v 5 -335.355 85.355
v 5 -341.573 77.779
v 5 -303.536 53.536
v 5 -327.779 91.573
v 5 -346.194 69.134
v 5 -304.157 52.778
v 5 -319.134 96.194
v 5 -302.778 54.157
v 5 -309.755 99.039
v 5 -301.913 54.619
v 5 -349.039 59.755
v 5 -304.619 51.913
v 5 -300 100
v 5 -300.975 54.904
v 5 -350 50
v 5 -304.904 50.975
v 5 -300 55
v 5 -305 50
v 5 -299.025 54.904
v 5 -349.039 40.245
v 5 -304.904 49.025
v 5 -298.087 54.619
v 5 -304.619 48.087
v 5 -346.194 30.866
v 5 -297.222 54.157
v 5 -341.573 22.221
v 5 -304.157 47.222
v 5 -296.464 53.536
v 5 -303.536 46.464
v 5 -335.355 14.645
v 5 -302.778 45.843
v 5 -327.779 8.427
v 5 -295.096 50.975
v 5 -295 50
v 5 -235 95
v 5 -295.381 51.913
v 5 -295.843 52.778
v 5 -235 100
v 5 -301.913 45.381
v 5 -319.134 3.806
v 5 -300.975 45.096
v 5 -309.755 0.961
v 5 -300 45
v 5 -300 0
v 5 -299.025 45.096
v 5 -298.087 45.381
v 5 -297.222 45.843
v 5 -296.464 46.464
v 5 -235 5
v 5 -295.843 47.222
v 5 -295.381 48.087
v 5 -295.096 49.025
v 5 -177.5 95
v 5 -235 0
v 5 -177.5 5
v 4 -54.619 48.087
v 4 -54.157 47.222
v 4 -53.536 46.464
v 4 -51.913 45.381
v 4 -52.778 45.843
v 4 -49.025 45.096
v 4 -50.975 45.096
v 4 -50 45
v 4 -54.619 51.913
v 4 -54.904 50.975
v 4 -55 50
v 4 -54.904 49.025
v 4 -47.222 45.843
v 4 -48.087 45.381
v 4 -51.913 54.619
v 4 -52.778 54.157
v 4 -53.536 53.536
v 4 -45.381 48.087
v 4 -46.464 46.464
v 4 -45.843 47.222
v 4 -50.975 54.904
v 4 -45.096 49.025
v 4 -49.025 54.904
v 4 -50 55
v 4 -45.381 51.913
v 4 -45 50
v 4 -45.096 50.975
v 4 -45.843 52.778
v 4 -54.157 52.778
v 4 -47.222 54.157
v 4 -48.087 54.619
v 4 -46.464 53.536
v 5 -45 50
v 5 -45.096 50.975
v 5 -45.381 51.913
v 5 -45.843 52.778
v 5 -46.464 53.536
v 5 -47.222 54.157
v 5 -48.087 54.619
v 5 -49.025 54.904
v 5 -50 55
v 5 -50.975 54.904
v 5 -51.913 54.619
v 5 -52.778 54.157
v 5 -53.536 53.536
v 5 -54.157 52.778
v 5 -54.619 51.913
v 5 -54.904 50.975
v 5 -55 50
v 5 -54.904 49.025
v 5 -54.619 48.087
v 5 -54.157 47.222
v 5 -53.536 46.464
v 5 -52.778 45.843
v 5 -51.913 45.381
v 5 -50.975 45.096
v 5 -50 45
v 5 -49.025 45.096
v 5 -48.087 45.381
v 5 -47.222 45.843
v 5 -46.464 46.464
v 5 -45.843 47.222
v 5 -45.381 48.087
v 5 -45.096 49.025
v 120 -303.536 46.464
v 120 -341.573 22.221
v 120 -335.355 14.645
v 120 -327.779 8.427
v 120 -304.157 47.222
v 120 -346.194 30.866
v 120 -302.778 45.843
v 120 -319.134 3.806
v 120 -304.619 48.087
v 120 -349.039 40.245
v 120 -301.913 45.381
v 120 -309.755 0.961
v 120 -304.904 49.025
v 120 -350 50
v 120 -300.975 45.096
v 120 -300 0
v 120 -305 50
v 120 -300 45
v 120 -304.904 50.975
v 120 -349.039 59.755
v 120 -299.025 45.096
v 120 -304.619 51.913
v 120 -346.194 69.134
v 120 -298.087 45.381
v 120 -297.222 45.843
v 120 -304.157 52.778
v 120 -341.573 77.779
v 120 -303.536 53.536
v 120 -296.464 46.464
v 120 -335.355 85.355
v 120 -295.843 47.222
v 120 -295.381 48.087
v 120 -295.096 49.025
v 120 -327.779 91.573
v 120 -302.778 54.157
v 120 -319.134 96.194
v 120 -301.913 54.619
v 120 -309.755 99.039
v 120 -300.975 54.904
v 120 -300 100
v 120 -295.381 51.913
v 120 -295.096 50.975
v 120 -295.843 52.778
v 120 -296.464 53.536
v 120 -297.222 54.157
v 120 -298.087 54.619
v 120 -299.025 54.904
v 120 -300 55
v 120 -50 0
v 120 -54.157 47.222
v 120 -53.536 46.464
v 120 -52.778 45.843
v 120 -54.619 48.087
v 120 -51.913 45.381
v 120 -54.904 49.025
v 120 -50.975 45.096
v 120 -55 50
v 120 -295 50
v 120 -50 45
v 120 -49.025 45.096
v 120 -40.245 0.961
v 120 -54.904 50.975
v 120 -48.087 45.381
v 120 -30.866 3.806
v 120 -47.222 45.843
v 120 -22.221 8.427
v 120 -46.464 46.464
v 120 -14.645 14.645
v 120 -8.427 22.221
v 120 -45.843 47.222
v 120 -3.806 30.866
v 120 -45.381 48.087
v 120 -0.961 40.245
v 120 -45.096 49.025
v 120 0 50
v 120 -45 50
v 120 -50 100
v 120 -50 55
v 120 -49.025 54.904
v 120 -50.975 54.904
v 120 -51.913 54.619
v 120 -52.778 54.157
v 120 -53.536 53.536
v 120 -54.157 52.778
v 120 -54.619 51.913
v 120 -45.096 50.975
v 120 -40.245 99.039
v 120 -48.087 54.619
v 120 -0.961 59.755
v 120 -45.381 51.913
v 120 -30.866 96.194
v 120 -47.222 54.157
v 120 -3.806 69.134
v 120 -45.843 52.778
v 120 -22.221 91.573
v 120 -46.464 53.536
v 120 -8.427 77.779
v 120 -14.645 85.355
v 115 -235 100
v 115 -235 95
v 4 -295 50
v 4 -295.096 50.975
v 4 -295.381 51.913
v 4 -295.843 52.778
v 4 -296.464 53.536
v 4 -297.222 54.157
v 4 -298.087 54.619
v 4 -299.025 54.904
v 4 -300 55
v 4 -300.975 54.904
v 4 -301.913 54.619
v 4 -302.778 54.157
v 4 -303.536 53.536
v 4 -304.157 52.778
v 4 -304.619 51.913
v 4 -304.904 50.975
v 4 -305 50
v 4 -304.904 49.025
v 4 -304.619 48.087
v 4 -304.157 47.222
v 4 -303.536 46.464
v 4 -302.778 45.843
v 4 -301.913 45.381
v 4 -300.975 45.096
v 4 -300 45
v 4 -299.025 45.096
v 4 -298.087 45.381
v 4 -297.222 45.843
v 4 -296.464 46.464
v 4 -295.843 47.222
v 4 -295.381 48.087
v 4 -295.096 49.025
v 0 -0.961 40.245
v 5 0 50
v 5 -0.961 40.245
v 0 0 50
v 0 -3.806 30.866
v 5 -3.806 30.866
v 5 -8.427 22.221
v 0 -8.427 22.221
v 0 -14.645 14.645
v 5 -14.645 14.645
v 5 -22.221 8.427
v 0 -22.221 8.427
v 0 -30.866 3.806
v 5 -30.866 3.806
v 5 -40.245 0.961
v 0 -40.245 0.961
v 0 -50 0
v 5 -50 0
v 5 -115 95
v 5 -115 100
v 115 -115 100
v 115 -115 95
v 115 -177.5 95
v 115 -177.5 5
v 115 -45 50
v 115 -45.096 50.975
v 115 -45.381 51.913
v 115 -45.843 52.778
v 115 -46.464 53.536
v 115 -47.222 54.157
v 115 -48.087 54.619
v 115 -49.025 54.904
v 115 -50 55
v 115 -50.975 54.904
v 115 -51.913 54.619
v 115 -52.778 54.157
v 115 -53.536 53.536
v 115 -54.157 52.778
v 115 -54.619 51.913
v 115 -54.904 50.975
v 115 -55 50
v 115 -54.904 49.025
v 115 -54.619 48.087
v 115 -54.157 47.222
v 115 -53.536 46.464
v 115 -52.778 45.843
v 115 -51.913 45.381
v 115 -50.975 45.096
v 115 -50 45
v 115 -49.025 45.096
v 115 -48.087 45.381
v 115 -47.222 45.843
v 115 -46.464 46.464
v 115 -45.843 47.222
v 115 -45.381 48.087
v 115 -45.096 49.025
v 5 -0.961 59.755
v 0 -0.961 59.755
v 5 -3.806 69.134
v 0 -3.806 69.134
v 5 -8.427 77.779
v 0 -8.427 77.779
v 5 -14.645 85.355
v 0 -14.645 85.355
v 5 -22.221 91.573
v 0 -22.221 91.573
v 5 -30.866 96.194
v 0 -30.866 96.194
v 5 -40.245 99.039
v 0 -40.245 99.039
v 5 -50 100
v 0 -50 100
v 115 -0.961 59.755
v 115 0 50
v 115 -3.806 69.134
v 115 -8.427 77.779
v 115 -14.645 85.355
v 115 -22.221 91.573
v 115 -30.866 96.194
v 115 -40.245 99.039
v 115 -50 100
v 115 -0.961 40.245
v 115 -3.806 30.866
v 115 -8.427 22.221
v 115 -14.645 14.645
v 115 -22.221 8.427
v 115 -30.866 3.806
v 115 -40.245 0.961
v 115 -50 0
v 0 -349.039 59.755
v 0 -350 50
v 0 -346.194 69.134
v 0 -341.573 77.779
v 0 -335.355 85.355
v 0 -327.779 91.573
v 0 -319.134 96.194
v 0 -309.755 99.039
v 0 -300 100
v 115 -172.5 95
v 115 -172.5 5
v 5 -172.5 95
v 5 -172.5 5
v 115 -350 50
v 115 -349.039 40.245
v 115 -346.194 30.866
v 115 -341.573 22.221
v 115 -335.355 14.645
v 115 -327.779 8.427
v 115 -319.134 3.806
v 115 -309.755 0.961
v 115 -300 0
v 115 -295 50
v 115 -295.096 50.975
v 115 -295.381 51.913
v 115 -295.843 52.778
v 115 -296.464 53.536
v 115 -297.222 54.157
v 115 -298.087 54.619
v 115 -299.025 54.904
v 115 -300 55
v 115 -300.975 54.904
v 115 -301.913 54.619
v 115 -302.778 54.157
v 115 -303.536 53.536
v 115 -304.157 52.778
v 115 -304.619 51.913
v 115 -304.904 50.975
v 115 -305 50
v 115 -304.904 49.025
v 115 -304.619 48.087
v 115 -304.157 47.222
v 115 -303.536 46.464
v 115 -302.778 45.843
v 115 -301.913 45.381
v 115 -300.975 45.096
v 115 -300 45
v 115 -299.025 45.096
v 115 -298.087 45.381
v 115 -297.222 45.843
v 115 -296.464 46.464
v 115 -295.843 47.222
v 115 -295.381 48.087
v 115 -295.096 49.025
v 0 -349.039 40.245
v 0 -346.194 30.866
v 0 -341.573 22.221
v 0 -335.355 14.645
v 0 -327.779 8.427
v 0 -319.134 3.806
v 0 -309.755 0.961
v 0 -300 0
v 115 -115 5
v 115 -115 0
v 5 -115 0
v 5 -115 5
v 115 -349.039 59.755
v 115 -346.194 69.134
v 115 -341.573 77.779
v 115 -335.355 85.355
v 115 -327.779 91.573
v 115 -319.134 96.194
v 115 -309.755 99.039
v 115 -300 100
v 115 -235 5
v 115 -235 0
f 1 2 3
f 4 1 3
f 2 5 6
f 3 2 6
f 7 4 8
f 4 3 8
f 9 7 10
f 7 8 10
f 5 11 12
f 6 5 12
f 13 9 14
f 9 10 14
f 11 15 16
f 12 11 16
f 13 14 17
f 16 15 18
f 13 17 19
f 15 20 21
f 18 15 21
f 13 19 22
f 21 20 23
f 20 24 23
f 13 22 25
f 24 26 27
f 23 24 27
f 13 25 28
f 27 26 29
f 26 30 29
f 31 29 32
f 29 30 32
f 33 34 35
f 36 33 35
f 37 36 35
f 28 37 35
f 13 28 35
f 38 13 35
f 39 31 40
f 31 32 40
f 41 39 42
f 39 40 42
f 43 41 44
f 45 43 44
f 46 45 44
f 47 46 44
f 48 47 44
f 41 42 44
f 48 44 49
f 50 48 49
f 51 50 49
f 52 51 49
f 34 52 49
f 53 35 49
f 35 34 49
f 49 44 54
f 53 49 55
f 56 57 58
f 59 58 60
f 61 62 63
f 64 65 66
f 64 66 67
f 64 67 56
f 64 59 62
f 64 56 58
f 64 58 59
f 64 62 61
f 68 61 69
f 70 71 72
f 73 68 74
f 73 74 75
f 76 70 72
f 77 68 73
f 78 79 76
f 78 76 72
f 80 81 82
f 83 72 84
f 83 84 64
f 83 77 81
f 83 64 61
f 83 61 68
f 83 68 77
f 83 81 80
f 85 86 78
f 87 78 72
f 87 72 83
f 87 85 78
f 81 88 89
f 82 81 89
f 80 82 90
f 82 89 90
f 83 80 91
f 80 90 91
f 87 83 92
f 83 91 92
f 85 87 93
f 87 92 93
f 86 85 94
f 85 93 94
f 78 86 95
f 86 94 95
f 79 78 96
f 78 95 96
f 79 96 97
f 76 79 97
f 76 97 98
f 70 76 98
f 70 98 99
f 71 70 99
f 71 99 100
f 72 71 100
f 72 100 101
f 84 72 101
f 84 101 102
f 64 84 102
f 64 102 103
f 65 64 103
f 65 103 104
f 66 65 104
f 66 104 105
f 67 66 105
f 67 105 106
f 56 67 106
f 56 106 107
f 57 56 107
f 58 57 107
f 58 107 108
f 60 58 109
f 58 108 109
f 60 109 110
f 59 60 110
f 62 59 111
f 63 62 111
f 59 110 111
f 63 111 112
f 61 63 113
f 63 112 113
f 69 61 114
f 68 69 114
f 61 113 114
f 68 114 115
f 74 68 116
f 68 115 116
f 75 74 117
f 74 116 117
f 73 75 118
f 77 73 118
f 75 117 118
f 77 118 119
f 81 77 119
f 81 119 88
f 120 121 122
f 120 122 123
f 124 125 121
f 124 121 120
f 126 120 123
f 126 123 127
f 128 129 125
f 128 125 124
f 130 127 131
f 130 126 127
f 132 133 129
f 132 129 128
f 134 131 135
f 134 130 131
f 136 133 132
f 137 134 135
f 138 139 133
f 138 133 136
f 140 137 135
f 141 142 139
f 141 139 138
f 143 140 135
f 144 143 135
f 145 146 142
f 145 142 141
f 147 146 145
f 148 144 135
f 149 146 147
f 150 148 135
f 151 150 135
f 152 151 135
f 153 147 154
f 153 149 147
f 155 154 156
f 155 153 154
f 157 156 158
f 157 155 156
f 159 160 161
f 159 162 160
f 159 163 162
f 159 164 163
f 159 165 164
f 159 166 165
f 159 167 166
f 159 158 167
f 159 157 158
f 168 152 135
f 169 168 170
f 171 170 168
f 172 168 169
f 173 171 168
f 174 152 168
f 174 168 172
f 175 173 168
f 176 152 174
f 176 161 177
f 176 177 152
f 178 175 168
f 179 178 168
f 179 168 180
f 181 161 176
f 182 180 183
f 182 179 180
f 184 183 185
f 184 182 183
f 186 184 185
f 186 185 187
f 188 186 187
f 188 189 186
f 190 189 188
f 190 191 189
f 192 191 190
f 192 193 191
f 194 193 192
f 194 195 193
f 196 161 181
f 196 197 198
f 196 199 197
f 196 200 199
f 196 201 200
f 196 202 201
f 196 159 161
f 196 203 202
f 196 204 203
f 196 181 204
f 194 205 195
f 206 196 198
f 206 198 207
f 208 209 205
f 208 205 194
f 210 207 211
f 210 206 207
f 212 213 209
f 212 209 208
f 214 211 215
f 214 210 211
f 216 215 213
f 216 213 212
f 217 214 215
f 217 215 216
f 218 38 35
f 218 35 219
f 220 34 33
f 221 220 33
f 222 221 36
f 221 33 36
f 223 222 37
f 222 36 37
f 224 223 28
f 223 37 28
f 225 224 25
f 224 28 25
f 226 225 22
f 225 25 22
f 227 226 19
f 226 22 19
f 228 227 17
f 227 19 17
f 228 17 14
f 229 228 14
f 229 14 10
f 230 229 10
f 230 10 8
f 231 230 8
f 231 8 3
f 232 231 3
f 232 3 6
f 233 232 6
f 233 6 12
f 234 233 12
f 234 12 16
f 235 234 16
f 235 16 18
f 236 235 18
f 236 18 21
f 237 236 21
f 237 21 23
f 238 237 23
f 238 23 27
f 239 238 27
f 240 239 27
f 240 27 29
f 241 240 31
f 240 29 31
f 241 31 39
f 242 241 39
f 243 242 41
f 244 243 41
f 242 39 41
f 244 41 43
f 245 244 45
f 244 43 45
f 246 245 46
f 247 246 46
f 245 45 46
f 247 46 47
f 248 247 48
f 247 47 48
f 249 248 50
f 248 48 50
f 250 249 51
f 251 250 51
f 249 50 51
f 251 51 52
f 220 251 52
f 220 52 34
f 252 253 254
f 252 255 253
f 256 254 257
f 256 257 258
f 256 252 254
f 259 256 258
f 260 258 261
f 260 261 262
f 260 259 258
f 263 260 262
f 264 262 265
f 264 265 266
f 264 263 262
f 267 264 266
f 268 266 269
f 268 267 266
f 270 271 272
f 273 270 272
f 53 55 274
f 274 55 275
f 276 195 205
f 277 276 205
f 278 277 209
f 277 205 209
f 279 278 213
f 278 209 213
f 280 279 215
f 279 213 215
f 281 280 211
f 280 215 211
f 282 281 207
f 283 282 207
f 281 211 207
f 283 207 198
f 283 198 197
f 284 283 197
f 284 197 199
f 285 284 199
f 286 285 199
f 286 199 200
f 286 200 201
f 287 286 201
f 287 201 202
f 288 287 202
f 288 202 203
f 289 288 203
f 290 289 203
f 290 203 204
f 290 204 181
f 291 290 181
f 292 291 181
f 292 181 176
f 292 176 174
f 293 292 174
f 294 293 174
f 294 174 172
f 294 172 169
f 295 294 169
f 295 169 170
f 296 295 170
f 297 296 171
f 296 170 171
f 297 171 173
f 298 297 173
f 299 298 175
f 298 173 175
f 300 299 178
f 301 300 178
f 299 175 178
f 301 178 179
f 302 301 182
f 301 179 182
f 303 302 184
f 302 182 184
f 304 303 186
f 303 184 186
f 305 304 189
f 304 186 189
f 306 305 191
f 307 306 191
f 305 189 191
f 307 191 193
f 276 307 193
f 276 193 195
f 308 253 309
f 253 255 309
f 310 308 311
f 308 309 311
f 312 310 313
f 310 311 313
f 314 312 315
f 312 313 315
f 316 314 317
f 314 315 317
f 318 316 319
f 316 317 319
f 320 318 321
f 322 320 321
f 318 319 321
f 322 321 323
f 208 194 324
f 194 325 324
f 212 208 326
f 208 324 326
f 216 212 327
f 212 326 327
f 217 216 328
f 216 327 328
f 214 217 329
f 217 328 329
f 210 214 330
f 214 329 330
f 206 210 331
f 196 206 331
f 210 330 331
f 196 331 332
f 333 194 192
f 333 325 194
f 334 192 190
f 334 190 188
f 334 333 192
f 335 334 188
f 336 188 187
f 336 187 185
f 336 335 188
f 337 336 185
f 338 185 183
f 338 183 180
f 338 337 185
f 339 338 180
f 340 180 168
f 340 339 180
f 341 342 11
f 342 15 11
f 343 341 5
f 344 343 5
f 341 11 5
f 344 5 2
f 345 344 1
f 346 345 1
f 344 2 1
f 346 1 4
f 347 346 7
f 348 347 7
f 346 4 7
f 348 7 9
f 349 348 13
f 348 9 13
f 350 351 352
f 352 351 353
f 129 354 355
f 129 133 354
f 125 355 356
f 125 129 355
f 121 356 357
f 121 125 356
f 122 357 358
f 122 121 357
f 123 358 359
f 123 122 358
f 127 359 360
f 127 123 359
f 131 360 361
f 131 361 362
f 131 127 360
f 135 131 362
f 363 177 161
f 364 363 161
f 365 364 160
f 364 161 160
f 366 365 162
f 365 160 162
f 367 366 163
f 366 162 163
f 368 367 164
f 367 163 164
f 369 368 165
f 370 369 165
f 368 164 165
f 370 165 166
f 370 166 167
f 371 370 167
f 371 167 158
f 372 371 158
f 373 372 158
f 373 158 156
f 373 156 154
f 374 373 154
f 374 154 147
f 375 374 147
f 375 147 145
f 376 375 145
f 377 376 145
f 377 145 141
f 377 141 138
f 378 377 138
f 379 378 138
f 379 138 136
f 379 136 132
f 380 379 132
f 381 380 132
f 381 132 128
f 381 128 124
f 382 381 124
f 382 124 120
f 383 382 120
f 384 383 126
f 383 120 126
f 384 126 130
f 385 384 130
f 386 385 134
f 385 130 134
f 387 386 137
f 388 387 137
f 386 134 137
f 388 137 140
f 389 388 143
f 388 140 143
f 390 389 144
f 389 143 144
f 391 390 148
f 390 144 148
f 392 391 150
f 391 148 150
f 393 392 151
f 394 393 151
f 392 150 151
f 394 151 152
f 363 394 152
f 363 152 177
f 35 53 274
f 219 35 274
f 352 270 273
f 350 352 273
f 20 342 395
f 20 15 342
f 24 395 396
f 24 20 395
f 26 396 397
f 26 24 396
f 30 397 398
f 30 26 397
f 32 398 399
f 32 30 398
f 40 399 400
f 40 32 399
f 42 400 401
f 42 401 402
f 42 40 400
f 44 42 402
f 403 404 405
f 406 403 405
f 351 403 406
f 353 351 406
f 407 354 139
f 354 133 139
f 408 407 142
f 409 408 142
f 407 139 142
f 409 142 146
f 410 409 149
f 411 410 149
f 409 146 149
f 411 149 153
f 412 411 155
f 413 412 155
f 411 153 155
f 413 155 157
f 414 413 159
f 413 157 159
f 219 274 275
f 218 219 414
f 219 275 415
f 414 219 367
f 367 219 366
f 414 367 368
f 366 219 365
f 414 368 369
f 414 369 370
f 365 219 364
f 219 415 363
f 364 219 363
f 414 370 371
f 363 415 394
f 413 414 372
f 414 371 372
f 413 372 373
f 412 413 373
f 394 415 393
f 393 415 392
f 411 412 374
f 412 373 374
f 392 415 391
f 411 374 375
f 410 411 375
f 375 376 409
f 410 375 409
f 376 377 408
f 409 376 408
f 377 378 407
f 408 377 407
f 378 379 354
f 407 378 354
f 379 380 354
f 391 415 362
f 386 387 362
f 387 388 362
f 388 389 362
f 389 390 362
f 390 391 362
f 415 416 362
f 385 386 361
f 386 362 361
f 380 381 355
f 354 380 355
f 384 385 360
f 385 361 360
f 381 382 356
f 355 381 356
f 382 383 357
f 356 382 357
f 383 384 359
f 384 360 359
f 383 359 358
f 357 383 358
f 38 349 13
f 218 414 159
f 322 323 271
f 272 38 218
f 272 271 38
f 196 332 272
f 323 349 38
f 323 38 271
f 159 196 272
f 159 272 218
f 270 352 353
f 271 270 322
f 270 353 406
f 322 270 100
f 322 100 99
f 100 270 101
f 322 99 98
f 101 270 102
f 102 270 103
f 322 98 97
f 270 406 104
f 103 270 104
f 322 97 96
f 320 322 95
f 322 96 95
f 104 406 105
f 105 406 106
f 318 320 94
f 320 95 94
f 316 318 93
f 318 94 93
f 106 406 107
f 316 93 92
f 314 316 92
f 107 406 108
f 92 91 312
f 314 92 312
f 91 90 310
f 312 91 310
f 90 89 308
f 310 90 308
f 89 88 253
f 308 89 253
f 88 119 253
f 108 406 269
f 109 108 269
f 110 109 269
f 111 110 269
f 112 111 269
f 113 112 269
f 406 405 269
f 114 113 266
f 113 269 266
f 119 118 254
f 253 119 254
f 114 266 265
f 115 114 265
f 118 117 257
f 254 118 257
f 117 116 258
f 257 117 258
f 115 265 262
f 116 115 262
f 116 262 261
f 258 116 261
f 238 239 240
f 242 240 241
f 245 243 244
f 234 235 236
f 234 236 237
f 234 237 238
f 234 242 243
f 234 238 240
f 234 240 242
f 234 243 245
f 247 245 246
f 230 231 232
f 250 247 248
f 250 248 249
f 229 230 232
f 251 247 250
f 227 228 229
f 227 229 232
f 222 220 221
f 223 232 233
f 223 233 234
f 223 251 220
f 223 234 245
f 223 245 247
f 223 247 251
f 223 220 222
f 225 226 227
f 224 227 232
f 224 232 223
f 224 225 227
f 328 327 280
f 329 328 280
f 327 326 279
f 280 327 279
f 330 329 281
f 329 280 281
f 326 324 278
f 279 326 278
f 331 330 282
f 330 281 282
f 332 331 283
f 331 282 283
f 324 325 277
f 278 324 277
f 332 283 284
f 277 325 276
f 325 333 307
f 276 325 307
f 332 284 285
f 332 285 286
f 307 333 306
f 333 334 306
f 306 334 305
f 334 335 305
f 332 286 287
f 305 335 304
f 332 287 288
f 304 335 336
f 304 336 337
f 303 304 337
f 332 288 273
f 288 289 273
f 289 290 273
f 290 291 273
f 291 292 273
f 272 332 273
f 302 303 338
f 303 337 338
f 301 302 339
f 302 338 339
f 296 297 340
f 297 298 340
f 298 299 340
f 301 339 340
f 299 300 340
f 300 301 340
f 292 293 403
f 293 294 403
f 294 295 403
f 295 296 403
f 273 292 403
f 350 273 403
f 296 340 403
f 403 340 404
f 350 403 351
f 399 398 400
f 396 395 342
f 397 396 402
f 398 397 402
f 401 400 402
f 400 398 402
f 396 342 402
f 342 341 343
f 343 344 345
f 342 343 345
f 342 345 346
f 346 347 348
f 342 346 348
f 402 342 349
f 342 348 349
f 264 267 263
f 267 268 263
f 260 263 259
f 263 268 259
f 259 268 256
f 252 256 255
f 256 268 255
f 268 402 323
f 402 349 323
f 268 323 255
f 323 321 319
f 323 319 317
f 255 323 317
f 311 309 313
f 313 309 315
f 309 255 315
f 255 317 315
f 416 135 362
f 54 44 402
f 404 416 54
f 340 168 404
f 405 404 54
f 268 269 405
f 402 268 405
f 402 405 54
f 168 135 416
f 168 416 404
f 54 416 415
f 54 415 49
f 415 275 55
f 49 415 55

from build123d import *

# Parameters (mm, degrees)
BOSS_EXTRUDE1_DEPTH = 100
FILLET1_R           = 50
SKETCH2_R           = 5
CUT_EXTRUDE1_DEPTH  = 116
SKETCH5_W           = 120
SKETCH5_H           = 120
BOSS_EXTRUDE4_DEPTH = 5
SKETCH6_W           = 110
SKETCH6_H           = 120
BOSS_EXTRUDE6_DEPTH = 5


with BuildPart() as part:
    # Sketch1 → Boss-Extrude1 (new body)
    with BuildSketch(Plane.XY):
        Polygon((5, -172.5), (5, -8), (5, 0), (0, 0), (0, -8), (0, -146), (0, -154), (0, -292), (0, -350), (5, -350), (5, -292), (5, -177.5), (115, -177.5), (115, -293.5), (115, -350), (120, -350), (120, -293.5), (120, -155.5), (120, -147.5), (120, -9.5), (120, 0), (115, 0), (115, -9.5), (115, -172.5), align=None)
    extrude(amount=BOSS_EXTRUDE1_DEPTH)

    # Fillet1
    fillet1_edges = [part.edges().sort_by_distance(p)[0] for p in [
        (2.5, 0, 100),
        (2.5, 0, 0),
        (117.5, -350, 0),
        (117.5, -350, 100),
        (2.5, -350, 100),
        (2.5, -350, 0),
        (117.5, 0, 100),
        (117.5, 0, 0),
    ]]
    fillet(fillet1_edges, radius=FILLET1_R - 0.0001)  # a hair under: the kernel refuses the full size

    # Sketch2 → Cut-Extrude1 (cut)
    with BuildSketch(Plane(origin=(120, 0, 0), x_dir=(0, 0, -1), z_dir=(1, 0, 0))):
        with Locations(Location((-50, -300, 0), (0, 0, 90))):
            Circle(SKETCH2_R)
        with Locations(Location((-50, -50, 0), (0, 0, 90))):
            Circle(SKETCH2_R)
    extrude(amount=-CUT_EXTRUDE1_DEPTH, mode=Mode.SUBTRACT)

    # Sketch5 → Boss-Extrude4 (add)
    with BuildSketch(Plane.XY.offset(100)):
        with Locations((60, -175)):
            Rectangle(SKETCH5_W, SKETCH5_H)
    extrude(amount=-BOSS_EXTRUDE4_DEPTH)

    # Sketch6 → Boss-Extrude6 (add)
    with BuildSketch(Plane(origin=(0, 0, 0), x_dir=(-1, 0, 0), z_dir=(0, 0, -1))):
        with Locations((-60, -175)):
            Rectangle(SKETCH6_W, SKETCH6_H)
    extrude(amount=-BOSS_EXTRUDE6_DEPTH)


solid = part.part
